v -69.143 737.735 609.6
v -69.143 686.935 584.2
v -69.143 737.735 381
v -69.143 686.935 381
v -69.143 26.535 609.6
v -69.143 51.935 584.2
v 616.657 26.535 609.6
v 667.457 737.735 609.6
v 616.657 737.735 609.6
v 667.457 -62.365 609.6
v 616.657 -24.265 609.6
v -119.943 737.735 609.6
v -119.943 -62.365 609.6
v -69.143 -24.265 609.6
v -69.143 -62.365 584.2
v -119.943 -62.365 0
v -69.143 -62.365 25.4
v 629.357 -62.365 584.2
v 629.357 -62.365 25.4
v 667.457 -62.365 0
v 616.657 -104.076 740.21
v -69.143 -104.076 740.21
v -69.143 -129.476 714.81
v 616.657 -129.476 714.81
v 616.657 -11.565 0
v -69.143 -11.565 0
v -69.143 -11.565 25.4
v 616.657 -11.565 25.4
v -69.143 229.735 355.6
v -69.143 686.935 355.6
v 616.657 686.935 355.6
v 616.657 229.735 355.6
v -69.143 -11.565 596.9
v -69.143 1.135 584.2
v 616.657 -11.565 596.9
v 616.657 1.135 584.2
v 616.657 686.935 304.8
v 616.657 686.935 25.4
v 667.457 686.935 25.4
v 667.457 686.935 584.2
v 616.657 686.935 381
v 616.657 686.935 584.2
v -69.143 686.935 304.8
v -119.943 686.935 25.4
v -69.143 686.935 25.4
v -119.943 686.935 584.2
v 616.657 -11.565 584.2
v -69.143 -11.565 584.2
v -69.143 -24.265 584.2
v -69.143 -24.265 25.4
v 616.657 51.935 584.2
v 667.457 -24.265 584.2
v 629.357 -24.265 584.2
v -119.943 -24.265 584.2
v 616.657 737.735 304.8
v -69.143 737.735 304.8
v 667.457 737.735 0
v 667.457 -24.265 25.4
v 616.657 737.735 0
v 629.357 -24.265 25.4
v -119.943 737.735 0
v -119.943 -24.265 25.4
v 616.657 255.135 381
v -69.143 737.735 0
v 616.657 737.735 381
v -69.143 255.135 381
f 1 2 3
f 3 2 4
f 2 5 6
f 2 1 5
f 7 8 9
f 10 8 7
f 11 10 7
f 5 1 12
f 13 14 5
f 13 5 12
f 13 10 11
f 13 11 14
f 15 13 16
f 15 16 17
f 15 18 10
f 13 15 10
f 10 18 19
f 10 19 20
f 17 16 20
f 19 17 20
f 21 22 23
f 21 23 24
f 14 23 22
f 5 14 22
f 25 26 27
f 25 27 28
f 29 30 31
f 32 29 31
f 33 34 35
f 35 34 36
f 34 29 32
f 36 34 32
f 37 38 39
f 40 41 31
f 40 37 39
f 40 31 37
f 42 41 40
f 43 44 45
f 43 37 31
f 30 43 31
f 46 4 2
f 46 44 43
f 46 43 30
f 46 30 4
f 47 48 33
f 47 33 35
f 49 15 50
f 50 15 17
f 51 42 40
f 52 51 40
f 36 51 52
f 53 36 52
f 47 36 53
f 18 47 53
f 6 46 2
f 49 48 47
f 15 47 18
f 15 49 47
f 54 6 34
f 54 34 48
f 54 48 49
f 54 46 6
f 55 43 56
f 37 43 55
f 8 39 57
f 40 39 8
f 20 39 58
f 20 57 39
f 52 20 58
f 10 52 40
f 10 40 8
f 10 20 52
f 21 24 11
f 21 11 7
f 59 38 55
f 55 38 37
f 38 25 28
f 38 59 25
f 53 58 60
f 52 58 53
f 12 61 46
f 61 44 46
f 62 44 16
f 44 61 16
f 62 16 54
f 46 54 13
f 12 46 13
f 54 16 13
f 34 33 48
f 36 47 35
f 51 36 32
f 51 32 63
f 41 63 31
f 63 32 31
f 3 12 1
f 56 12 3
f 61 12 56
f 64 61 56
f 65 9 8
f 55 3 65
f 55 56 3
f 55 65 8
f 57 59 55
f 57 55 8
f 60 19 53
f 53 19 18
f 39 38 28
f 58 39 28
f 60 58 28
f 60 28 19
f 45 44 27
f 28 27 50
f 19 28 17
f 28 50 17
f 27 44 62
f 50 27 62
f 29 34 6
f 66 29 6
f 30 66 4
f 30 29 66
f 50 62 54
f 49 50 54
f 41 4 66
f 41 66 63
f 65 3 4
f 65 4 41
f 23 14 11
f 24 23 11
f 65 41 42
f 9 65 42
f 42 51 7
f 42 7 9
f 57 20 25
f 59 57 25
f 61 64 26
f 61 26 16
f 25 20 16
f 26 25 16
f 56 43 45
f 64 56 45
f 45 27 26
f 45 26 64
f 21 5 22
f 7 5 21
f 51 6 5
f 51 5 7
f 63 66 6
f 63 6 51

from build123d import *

# Parameters (mm, degrees)
F0_W      = 787.4
F0_H      = 50.8
F1_DEPTH  = 609.6
F2_W      = 711.2
F2_H      = 558.8
F3_DEPTH  = 50.8
F4_W      = 38.1
F4_H      = 609.6
F5_DEPTH  = 736.6
F6_W      = 711.2
F6_H      = 558.8
F7_DEPTH  = 50.8
F8_DEPTH  = 12.7
F10_DEPTH = 736.6
F11_DEPTH = 12.7
F12_W     = 711.2
F12_H     = 558.8
F13_DEPTH = 50.8
F14_W     = 38.1
F14_H     = 50.8
F15_DEPTH = 711.2
F16_DEPTH = 12.7
F17_W     = 685.8
F17_H     = 508
F18_DEPTH = 25.4
F19_SIZE  = 25.39999
F20_W     = 685.8
F20_H     = 35.9210244843
F21_DEPTH = 508


# Not quite as in the source:
# - a fillet or chamfer is up to 0.001 mm smaller than in the source, because OpenCascade refuses the exact size


with BuildPart() as f1:
    # F0 (on Top) → F1 (new body)
    with BuildSketch(Plane.XY):
        with Locations((273.7565302372, -36.9653456569)):
            Rectangle(F0_W, F0_H)
    extrude(amount=F1_DEPTH)

    # F2 (on face) → F3 (cut)
    with BuildSketch(Plane.XZ.offset(62.3653456569)):
        with Locations((273.7565302372, 304.8)):
            Rectangle(F2_W, F2_H)
    extrude(amount=-F3_DEPTH, mode=Mode.SUBTRACT)

    # F4 (on face) → F5 (join)
    with BuildSketch(Plane(origin=(0, -11.5653456569, 0), x_dir=(-1, 0, 0), z_dir=(0, 1, 0))):
        with Locations((-648.4065302372, 304.8)):
            Rectangle(F4_W, F4_H)
    extrude(amount=F5_DEPTH)

    # F6 (on face) → F7 (cut)
    with BuildSketch(Plane.YZ.offset(667.4565302372)):
        with Locations((331.3346543431, 304.8)):
            Rectangle(F6_W, F6_H)
    extrude(amount=-F7_DEPTH, mode=Mode.SUBTRACT)

    # F8 (add): a face of the model
    f8_faces = [f1.faces().sort_by_distance(p)[0] for p in [
        (629.3565302372, -2.0040083027, 12.7),
    ]]
    extrude(f8_faces, amount=F8_DEPTH)

    # F9 (on face) → F10 (join)
    with BuildSketch(Plane(origin=(0, -11.5653456569, 0), x_dir=(-1, 0, 0), z_dir=(0, 1, 0))):
        Polygon((119.9434697628, 0), (119.9434697628, 609.6), (81.8434697628, 609.6), (81.8434697628, 584.2), (81.8434697628, 25.4), (81.8434697628, 0), align=None)
    extrude(amount=F10_DEPTH)

    # F11 (add): a face of the model
    f11_faces = [f1.faces().sort_by_distance(p)[0] for p in [
        (-81.8434697628, 333.3254651539, 304.8),
    ]]
    extrude(f11_faces, amount=F11_DEPTH)

    # F12 (on face) → F13 (cut)
    with BuildSketch(Plane(origin=(-119.9434697628, 0, 0), x_dir=(0, -1, 0), z_dir=(-1, 0, 0))):
        with Locations((-331.3346543431, 304.8)):
            Rectangle(F12_W, F12_H)
    extrude(amount=-F13_DEPTH, mode=Mode.SUBTRACT)

    # F14 (on face) → F15 (join)
    with BuildSketch(Plane.YZ.offset(-69.1434697628)):
        with Locations((705.9846543431, 330.2)):
            Rectangle(F14_W, F14_H)
    extrude(amount=F15_DEPTH)

    # F16 (add): a face of the model
    f16_faces = [f1.faces().sort_by_distance(p)[0] for p in [
        (273.7565302372, 725.0346543431, 313.944),
    ]]
    extrude(f16_faces, amount=F16_DEPTH)

    # F17 (on face) → F18 (join)
    with BuildSketch(Plane.XY.offset(355.6)):
        with Locations((273.7565302372, 483.7346543431)):
            Rectangle(F17_W, F17_H)
    extrude(amount=F18_DEPTH)

    # F19 (size 25.4 in the source; OpenCascade refuses exactly that, so slightly less here)
    f19_edges = [f1.edges().sort_by_distance(p)[0] for p in [
        (273.75653, 229.734654, 381),
    ]]
    chamfer(f19_edges, length=F19_SIZE)

    # F20 (on face) → F21 (join)
    with BuildSketch(Plane(origin=(0, -62.9326728284, 62.9326728284), x_dir=(1, 0, 0), z_dir=(0, -0.7071067812, 0.7071067812))):
        with Locations((273.7565302372, 431.8546155916)):
            Rectangle(F20_W, F20_H)
    extrude(amount=F21_DEPTH)


solid = f1.part
